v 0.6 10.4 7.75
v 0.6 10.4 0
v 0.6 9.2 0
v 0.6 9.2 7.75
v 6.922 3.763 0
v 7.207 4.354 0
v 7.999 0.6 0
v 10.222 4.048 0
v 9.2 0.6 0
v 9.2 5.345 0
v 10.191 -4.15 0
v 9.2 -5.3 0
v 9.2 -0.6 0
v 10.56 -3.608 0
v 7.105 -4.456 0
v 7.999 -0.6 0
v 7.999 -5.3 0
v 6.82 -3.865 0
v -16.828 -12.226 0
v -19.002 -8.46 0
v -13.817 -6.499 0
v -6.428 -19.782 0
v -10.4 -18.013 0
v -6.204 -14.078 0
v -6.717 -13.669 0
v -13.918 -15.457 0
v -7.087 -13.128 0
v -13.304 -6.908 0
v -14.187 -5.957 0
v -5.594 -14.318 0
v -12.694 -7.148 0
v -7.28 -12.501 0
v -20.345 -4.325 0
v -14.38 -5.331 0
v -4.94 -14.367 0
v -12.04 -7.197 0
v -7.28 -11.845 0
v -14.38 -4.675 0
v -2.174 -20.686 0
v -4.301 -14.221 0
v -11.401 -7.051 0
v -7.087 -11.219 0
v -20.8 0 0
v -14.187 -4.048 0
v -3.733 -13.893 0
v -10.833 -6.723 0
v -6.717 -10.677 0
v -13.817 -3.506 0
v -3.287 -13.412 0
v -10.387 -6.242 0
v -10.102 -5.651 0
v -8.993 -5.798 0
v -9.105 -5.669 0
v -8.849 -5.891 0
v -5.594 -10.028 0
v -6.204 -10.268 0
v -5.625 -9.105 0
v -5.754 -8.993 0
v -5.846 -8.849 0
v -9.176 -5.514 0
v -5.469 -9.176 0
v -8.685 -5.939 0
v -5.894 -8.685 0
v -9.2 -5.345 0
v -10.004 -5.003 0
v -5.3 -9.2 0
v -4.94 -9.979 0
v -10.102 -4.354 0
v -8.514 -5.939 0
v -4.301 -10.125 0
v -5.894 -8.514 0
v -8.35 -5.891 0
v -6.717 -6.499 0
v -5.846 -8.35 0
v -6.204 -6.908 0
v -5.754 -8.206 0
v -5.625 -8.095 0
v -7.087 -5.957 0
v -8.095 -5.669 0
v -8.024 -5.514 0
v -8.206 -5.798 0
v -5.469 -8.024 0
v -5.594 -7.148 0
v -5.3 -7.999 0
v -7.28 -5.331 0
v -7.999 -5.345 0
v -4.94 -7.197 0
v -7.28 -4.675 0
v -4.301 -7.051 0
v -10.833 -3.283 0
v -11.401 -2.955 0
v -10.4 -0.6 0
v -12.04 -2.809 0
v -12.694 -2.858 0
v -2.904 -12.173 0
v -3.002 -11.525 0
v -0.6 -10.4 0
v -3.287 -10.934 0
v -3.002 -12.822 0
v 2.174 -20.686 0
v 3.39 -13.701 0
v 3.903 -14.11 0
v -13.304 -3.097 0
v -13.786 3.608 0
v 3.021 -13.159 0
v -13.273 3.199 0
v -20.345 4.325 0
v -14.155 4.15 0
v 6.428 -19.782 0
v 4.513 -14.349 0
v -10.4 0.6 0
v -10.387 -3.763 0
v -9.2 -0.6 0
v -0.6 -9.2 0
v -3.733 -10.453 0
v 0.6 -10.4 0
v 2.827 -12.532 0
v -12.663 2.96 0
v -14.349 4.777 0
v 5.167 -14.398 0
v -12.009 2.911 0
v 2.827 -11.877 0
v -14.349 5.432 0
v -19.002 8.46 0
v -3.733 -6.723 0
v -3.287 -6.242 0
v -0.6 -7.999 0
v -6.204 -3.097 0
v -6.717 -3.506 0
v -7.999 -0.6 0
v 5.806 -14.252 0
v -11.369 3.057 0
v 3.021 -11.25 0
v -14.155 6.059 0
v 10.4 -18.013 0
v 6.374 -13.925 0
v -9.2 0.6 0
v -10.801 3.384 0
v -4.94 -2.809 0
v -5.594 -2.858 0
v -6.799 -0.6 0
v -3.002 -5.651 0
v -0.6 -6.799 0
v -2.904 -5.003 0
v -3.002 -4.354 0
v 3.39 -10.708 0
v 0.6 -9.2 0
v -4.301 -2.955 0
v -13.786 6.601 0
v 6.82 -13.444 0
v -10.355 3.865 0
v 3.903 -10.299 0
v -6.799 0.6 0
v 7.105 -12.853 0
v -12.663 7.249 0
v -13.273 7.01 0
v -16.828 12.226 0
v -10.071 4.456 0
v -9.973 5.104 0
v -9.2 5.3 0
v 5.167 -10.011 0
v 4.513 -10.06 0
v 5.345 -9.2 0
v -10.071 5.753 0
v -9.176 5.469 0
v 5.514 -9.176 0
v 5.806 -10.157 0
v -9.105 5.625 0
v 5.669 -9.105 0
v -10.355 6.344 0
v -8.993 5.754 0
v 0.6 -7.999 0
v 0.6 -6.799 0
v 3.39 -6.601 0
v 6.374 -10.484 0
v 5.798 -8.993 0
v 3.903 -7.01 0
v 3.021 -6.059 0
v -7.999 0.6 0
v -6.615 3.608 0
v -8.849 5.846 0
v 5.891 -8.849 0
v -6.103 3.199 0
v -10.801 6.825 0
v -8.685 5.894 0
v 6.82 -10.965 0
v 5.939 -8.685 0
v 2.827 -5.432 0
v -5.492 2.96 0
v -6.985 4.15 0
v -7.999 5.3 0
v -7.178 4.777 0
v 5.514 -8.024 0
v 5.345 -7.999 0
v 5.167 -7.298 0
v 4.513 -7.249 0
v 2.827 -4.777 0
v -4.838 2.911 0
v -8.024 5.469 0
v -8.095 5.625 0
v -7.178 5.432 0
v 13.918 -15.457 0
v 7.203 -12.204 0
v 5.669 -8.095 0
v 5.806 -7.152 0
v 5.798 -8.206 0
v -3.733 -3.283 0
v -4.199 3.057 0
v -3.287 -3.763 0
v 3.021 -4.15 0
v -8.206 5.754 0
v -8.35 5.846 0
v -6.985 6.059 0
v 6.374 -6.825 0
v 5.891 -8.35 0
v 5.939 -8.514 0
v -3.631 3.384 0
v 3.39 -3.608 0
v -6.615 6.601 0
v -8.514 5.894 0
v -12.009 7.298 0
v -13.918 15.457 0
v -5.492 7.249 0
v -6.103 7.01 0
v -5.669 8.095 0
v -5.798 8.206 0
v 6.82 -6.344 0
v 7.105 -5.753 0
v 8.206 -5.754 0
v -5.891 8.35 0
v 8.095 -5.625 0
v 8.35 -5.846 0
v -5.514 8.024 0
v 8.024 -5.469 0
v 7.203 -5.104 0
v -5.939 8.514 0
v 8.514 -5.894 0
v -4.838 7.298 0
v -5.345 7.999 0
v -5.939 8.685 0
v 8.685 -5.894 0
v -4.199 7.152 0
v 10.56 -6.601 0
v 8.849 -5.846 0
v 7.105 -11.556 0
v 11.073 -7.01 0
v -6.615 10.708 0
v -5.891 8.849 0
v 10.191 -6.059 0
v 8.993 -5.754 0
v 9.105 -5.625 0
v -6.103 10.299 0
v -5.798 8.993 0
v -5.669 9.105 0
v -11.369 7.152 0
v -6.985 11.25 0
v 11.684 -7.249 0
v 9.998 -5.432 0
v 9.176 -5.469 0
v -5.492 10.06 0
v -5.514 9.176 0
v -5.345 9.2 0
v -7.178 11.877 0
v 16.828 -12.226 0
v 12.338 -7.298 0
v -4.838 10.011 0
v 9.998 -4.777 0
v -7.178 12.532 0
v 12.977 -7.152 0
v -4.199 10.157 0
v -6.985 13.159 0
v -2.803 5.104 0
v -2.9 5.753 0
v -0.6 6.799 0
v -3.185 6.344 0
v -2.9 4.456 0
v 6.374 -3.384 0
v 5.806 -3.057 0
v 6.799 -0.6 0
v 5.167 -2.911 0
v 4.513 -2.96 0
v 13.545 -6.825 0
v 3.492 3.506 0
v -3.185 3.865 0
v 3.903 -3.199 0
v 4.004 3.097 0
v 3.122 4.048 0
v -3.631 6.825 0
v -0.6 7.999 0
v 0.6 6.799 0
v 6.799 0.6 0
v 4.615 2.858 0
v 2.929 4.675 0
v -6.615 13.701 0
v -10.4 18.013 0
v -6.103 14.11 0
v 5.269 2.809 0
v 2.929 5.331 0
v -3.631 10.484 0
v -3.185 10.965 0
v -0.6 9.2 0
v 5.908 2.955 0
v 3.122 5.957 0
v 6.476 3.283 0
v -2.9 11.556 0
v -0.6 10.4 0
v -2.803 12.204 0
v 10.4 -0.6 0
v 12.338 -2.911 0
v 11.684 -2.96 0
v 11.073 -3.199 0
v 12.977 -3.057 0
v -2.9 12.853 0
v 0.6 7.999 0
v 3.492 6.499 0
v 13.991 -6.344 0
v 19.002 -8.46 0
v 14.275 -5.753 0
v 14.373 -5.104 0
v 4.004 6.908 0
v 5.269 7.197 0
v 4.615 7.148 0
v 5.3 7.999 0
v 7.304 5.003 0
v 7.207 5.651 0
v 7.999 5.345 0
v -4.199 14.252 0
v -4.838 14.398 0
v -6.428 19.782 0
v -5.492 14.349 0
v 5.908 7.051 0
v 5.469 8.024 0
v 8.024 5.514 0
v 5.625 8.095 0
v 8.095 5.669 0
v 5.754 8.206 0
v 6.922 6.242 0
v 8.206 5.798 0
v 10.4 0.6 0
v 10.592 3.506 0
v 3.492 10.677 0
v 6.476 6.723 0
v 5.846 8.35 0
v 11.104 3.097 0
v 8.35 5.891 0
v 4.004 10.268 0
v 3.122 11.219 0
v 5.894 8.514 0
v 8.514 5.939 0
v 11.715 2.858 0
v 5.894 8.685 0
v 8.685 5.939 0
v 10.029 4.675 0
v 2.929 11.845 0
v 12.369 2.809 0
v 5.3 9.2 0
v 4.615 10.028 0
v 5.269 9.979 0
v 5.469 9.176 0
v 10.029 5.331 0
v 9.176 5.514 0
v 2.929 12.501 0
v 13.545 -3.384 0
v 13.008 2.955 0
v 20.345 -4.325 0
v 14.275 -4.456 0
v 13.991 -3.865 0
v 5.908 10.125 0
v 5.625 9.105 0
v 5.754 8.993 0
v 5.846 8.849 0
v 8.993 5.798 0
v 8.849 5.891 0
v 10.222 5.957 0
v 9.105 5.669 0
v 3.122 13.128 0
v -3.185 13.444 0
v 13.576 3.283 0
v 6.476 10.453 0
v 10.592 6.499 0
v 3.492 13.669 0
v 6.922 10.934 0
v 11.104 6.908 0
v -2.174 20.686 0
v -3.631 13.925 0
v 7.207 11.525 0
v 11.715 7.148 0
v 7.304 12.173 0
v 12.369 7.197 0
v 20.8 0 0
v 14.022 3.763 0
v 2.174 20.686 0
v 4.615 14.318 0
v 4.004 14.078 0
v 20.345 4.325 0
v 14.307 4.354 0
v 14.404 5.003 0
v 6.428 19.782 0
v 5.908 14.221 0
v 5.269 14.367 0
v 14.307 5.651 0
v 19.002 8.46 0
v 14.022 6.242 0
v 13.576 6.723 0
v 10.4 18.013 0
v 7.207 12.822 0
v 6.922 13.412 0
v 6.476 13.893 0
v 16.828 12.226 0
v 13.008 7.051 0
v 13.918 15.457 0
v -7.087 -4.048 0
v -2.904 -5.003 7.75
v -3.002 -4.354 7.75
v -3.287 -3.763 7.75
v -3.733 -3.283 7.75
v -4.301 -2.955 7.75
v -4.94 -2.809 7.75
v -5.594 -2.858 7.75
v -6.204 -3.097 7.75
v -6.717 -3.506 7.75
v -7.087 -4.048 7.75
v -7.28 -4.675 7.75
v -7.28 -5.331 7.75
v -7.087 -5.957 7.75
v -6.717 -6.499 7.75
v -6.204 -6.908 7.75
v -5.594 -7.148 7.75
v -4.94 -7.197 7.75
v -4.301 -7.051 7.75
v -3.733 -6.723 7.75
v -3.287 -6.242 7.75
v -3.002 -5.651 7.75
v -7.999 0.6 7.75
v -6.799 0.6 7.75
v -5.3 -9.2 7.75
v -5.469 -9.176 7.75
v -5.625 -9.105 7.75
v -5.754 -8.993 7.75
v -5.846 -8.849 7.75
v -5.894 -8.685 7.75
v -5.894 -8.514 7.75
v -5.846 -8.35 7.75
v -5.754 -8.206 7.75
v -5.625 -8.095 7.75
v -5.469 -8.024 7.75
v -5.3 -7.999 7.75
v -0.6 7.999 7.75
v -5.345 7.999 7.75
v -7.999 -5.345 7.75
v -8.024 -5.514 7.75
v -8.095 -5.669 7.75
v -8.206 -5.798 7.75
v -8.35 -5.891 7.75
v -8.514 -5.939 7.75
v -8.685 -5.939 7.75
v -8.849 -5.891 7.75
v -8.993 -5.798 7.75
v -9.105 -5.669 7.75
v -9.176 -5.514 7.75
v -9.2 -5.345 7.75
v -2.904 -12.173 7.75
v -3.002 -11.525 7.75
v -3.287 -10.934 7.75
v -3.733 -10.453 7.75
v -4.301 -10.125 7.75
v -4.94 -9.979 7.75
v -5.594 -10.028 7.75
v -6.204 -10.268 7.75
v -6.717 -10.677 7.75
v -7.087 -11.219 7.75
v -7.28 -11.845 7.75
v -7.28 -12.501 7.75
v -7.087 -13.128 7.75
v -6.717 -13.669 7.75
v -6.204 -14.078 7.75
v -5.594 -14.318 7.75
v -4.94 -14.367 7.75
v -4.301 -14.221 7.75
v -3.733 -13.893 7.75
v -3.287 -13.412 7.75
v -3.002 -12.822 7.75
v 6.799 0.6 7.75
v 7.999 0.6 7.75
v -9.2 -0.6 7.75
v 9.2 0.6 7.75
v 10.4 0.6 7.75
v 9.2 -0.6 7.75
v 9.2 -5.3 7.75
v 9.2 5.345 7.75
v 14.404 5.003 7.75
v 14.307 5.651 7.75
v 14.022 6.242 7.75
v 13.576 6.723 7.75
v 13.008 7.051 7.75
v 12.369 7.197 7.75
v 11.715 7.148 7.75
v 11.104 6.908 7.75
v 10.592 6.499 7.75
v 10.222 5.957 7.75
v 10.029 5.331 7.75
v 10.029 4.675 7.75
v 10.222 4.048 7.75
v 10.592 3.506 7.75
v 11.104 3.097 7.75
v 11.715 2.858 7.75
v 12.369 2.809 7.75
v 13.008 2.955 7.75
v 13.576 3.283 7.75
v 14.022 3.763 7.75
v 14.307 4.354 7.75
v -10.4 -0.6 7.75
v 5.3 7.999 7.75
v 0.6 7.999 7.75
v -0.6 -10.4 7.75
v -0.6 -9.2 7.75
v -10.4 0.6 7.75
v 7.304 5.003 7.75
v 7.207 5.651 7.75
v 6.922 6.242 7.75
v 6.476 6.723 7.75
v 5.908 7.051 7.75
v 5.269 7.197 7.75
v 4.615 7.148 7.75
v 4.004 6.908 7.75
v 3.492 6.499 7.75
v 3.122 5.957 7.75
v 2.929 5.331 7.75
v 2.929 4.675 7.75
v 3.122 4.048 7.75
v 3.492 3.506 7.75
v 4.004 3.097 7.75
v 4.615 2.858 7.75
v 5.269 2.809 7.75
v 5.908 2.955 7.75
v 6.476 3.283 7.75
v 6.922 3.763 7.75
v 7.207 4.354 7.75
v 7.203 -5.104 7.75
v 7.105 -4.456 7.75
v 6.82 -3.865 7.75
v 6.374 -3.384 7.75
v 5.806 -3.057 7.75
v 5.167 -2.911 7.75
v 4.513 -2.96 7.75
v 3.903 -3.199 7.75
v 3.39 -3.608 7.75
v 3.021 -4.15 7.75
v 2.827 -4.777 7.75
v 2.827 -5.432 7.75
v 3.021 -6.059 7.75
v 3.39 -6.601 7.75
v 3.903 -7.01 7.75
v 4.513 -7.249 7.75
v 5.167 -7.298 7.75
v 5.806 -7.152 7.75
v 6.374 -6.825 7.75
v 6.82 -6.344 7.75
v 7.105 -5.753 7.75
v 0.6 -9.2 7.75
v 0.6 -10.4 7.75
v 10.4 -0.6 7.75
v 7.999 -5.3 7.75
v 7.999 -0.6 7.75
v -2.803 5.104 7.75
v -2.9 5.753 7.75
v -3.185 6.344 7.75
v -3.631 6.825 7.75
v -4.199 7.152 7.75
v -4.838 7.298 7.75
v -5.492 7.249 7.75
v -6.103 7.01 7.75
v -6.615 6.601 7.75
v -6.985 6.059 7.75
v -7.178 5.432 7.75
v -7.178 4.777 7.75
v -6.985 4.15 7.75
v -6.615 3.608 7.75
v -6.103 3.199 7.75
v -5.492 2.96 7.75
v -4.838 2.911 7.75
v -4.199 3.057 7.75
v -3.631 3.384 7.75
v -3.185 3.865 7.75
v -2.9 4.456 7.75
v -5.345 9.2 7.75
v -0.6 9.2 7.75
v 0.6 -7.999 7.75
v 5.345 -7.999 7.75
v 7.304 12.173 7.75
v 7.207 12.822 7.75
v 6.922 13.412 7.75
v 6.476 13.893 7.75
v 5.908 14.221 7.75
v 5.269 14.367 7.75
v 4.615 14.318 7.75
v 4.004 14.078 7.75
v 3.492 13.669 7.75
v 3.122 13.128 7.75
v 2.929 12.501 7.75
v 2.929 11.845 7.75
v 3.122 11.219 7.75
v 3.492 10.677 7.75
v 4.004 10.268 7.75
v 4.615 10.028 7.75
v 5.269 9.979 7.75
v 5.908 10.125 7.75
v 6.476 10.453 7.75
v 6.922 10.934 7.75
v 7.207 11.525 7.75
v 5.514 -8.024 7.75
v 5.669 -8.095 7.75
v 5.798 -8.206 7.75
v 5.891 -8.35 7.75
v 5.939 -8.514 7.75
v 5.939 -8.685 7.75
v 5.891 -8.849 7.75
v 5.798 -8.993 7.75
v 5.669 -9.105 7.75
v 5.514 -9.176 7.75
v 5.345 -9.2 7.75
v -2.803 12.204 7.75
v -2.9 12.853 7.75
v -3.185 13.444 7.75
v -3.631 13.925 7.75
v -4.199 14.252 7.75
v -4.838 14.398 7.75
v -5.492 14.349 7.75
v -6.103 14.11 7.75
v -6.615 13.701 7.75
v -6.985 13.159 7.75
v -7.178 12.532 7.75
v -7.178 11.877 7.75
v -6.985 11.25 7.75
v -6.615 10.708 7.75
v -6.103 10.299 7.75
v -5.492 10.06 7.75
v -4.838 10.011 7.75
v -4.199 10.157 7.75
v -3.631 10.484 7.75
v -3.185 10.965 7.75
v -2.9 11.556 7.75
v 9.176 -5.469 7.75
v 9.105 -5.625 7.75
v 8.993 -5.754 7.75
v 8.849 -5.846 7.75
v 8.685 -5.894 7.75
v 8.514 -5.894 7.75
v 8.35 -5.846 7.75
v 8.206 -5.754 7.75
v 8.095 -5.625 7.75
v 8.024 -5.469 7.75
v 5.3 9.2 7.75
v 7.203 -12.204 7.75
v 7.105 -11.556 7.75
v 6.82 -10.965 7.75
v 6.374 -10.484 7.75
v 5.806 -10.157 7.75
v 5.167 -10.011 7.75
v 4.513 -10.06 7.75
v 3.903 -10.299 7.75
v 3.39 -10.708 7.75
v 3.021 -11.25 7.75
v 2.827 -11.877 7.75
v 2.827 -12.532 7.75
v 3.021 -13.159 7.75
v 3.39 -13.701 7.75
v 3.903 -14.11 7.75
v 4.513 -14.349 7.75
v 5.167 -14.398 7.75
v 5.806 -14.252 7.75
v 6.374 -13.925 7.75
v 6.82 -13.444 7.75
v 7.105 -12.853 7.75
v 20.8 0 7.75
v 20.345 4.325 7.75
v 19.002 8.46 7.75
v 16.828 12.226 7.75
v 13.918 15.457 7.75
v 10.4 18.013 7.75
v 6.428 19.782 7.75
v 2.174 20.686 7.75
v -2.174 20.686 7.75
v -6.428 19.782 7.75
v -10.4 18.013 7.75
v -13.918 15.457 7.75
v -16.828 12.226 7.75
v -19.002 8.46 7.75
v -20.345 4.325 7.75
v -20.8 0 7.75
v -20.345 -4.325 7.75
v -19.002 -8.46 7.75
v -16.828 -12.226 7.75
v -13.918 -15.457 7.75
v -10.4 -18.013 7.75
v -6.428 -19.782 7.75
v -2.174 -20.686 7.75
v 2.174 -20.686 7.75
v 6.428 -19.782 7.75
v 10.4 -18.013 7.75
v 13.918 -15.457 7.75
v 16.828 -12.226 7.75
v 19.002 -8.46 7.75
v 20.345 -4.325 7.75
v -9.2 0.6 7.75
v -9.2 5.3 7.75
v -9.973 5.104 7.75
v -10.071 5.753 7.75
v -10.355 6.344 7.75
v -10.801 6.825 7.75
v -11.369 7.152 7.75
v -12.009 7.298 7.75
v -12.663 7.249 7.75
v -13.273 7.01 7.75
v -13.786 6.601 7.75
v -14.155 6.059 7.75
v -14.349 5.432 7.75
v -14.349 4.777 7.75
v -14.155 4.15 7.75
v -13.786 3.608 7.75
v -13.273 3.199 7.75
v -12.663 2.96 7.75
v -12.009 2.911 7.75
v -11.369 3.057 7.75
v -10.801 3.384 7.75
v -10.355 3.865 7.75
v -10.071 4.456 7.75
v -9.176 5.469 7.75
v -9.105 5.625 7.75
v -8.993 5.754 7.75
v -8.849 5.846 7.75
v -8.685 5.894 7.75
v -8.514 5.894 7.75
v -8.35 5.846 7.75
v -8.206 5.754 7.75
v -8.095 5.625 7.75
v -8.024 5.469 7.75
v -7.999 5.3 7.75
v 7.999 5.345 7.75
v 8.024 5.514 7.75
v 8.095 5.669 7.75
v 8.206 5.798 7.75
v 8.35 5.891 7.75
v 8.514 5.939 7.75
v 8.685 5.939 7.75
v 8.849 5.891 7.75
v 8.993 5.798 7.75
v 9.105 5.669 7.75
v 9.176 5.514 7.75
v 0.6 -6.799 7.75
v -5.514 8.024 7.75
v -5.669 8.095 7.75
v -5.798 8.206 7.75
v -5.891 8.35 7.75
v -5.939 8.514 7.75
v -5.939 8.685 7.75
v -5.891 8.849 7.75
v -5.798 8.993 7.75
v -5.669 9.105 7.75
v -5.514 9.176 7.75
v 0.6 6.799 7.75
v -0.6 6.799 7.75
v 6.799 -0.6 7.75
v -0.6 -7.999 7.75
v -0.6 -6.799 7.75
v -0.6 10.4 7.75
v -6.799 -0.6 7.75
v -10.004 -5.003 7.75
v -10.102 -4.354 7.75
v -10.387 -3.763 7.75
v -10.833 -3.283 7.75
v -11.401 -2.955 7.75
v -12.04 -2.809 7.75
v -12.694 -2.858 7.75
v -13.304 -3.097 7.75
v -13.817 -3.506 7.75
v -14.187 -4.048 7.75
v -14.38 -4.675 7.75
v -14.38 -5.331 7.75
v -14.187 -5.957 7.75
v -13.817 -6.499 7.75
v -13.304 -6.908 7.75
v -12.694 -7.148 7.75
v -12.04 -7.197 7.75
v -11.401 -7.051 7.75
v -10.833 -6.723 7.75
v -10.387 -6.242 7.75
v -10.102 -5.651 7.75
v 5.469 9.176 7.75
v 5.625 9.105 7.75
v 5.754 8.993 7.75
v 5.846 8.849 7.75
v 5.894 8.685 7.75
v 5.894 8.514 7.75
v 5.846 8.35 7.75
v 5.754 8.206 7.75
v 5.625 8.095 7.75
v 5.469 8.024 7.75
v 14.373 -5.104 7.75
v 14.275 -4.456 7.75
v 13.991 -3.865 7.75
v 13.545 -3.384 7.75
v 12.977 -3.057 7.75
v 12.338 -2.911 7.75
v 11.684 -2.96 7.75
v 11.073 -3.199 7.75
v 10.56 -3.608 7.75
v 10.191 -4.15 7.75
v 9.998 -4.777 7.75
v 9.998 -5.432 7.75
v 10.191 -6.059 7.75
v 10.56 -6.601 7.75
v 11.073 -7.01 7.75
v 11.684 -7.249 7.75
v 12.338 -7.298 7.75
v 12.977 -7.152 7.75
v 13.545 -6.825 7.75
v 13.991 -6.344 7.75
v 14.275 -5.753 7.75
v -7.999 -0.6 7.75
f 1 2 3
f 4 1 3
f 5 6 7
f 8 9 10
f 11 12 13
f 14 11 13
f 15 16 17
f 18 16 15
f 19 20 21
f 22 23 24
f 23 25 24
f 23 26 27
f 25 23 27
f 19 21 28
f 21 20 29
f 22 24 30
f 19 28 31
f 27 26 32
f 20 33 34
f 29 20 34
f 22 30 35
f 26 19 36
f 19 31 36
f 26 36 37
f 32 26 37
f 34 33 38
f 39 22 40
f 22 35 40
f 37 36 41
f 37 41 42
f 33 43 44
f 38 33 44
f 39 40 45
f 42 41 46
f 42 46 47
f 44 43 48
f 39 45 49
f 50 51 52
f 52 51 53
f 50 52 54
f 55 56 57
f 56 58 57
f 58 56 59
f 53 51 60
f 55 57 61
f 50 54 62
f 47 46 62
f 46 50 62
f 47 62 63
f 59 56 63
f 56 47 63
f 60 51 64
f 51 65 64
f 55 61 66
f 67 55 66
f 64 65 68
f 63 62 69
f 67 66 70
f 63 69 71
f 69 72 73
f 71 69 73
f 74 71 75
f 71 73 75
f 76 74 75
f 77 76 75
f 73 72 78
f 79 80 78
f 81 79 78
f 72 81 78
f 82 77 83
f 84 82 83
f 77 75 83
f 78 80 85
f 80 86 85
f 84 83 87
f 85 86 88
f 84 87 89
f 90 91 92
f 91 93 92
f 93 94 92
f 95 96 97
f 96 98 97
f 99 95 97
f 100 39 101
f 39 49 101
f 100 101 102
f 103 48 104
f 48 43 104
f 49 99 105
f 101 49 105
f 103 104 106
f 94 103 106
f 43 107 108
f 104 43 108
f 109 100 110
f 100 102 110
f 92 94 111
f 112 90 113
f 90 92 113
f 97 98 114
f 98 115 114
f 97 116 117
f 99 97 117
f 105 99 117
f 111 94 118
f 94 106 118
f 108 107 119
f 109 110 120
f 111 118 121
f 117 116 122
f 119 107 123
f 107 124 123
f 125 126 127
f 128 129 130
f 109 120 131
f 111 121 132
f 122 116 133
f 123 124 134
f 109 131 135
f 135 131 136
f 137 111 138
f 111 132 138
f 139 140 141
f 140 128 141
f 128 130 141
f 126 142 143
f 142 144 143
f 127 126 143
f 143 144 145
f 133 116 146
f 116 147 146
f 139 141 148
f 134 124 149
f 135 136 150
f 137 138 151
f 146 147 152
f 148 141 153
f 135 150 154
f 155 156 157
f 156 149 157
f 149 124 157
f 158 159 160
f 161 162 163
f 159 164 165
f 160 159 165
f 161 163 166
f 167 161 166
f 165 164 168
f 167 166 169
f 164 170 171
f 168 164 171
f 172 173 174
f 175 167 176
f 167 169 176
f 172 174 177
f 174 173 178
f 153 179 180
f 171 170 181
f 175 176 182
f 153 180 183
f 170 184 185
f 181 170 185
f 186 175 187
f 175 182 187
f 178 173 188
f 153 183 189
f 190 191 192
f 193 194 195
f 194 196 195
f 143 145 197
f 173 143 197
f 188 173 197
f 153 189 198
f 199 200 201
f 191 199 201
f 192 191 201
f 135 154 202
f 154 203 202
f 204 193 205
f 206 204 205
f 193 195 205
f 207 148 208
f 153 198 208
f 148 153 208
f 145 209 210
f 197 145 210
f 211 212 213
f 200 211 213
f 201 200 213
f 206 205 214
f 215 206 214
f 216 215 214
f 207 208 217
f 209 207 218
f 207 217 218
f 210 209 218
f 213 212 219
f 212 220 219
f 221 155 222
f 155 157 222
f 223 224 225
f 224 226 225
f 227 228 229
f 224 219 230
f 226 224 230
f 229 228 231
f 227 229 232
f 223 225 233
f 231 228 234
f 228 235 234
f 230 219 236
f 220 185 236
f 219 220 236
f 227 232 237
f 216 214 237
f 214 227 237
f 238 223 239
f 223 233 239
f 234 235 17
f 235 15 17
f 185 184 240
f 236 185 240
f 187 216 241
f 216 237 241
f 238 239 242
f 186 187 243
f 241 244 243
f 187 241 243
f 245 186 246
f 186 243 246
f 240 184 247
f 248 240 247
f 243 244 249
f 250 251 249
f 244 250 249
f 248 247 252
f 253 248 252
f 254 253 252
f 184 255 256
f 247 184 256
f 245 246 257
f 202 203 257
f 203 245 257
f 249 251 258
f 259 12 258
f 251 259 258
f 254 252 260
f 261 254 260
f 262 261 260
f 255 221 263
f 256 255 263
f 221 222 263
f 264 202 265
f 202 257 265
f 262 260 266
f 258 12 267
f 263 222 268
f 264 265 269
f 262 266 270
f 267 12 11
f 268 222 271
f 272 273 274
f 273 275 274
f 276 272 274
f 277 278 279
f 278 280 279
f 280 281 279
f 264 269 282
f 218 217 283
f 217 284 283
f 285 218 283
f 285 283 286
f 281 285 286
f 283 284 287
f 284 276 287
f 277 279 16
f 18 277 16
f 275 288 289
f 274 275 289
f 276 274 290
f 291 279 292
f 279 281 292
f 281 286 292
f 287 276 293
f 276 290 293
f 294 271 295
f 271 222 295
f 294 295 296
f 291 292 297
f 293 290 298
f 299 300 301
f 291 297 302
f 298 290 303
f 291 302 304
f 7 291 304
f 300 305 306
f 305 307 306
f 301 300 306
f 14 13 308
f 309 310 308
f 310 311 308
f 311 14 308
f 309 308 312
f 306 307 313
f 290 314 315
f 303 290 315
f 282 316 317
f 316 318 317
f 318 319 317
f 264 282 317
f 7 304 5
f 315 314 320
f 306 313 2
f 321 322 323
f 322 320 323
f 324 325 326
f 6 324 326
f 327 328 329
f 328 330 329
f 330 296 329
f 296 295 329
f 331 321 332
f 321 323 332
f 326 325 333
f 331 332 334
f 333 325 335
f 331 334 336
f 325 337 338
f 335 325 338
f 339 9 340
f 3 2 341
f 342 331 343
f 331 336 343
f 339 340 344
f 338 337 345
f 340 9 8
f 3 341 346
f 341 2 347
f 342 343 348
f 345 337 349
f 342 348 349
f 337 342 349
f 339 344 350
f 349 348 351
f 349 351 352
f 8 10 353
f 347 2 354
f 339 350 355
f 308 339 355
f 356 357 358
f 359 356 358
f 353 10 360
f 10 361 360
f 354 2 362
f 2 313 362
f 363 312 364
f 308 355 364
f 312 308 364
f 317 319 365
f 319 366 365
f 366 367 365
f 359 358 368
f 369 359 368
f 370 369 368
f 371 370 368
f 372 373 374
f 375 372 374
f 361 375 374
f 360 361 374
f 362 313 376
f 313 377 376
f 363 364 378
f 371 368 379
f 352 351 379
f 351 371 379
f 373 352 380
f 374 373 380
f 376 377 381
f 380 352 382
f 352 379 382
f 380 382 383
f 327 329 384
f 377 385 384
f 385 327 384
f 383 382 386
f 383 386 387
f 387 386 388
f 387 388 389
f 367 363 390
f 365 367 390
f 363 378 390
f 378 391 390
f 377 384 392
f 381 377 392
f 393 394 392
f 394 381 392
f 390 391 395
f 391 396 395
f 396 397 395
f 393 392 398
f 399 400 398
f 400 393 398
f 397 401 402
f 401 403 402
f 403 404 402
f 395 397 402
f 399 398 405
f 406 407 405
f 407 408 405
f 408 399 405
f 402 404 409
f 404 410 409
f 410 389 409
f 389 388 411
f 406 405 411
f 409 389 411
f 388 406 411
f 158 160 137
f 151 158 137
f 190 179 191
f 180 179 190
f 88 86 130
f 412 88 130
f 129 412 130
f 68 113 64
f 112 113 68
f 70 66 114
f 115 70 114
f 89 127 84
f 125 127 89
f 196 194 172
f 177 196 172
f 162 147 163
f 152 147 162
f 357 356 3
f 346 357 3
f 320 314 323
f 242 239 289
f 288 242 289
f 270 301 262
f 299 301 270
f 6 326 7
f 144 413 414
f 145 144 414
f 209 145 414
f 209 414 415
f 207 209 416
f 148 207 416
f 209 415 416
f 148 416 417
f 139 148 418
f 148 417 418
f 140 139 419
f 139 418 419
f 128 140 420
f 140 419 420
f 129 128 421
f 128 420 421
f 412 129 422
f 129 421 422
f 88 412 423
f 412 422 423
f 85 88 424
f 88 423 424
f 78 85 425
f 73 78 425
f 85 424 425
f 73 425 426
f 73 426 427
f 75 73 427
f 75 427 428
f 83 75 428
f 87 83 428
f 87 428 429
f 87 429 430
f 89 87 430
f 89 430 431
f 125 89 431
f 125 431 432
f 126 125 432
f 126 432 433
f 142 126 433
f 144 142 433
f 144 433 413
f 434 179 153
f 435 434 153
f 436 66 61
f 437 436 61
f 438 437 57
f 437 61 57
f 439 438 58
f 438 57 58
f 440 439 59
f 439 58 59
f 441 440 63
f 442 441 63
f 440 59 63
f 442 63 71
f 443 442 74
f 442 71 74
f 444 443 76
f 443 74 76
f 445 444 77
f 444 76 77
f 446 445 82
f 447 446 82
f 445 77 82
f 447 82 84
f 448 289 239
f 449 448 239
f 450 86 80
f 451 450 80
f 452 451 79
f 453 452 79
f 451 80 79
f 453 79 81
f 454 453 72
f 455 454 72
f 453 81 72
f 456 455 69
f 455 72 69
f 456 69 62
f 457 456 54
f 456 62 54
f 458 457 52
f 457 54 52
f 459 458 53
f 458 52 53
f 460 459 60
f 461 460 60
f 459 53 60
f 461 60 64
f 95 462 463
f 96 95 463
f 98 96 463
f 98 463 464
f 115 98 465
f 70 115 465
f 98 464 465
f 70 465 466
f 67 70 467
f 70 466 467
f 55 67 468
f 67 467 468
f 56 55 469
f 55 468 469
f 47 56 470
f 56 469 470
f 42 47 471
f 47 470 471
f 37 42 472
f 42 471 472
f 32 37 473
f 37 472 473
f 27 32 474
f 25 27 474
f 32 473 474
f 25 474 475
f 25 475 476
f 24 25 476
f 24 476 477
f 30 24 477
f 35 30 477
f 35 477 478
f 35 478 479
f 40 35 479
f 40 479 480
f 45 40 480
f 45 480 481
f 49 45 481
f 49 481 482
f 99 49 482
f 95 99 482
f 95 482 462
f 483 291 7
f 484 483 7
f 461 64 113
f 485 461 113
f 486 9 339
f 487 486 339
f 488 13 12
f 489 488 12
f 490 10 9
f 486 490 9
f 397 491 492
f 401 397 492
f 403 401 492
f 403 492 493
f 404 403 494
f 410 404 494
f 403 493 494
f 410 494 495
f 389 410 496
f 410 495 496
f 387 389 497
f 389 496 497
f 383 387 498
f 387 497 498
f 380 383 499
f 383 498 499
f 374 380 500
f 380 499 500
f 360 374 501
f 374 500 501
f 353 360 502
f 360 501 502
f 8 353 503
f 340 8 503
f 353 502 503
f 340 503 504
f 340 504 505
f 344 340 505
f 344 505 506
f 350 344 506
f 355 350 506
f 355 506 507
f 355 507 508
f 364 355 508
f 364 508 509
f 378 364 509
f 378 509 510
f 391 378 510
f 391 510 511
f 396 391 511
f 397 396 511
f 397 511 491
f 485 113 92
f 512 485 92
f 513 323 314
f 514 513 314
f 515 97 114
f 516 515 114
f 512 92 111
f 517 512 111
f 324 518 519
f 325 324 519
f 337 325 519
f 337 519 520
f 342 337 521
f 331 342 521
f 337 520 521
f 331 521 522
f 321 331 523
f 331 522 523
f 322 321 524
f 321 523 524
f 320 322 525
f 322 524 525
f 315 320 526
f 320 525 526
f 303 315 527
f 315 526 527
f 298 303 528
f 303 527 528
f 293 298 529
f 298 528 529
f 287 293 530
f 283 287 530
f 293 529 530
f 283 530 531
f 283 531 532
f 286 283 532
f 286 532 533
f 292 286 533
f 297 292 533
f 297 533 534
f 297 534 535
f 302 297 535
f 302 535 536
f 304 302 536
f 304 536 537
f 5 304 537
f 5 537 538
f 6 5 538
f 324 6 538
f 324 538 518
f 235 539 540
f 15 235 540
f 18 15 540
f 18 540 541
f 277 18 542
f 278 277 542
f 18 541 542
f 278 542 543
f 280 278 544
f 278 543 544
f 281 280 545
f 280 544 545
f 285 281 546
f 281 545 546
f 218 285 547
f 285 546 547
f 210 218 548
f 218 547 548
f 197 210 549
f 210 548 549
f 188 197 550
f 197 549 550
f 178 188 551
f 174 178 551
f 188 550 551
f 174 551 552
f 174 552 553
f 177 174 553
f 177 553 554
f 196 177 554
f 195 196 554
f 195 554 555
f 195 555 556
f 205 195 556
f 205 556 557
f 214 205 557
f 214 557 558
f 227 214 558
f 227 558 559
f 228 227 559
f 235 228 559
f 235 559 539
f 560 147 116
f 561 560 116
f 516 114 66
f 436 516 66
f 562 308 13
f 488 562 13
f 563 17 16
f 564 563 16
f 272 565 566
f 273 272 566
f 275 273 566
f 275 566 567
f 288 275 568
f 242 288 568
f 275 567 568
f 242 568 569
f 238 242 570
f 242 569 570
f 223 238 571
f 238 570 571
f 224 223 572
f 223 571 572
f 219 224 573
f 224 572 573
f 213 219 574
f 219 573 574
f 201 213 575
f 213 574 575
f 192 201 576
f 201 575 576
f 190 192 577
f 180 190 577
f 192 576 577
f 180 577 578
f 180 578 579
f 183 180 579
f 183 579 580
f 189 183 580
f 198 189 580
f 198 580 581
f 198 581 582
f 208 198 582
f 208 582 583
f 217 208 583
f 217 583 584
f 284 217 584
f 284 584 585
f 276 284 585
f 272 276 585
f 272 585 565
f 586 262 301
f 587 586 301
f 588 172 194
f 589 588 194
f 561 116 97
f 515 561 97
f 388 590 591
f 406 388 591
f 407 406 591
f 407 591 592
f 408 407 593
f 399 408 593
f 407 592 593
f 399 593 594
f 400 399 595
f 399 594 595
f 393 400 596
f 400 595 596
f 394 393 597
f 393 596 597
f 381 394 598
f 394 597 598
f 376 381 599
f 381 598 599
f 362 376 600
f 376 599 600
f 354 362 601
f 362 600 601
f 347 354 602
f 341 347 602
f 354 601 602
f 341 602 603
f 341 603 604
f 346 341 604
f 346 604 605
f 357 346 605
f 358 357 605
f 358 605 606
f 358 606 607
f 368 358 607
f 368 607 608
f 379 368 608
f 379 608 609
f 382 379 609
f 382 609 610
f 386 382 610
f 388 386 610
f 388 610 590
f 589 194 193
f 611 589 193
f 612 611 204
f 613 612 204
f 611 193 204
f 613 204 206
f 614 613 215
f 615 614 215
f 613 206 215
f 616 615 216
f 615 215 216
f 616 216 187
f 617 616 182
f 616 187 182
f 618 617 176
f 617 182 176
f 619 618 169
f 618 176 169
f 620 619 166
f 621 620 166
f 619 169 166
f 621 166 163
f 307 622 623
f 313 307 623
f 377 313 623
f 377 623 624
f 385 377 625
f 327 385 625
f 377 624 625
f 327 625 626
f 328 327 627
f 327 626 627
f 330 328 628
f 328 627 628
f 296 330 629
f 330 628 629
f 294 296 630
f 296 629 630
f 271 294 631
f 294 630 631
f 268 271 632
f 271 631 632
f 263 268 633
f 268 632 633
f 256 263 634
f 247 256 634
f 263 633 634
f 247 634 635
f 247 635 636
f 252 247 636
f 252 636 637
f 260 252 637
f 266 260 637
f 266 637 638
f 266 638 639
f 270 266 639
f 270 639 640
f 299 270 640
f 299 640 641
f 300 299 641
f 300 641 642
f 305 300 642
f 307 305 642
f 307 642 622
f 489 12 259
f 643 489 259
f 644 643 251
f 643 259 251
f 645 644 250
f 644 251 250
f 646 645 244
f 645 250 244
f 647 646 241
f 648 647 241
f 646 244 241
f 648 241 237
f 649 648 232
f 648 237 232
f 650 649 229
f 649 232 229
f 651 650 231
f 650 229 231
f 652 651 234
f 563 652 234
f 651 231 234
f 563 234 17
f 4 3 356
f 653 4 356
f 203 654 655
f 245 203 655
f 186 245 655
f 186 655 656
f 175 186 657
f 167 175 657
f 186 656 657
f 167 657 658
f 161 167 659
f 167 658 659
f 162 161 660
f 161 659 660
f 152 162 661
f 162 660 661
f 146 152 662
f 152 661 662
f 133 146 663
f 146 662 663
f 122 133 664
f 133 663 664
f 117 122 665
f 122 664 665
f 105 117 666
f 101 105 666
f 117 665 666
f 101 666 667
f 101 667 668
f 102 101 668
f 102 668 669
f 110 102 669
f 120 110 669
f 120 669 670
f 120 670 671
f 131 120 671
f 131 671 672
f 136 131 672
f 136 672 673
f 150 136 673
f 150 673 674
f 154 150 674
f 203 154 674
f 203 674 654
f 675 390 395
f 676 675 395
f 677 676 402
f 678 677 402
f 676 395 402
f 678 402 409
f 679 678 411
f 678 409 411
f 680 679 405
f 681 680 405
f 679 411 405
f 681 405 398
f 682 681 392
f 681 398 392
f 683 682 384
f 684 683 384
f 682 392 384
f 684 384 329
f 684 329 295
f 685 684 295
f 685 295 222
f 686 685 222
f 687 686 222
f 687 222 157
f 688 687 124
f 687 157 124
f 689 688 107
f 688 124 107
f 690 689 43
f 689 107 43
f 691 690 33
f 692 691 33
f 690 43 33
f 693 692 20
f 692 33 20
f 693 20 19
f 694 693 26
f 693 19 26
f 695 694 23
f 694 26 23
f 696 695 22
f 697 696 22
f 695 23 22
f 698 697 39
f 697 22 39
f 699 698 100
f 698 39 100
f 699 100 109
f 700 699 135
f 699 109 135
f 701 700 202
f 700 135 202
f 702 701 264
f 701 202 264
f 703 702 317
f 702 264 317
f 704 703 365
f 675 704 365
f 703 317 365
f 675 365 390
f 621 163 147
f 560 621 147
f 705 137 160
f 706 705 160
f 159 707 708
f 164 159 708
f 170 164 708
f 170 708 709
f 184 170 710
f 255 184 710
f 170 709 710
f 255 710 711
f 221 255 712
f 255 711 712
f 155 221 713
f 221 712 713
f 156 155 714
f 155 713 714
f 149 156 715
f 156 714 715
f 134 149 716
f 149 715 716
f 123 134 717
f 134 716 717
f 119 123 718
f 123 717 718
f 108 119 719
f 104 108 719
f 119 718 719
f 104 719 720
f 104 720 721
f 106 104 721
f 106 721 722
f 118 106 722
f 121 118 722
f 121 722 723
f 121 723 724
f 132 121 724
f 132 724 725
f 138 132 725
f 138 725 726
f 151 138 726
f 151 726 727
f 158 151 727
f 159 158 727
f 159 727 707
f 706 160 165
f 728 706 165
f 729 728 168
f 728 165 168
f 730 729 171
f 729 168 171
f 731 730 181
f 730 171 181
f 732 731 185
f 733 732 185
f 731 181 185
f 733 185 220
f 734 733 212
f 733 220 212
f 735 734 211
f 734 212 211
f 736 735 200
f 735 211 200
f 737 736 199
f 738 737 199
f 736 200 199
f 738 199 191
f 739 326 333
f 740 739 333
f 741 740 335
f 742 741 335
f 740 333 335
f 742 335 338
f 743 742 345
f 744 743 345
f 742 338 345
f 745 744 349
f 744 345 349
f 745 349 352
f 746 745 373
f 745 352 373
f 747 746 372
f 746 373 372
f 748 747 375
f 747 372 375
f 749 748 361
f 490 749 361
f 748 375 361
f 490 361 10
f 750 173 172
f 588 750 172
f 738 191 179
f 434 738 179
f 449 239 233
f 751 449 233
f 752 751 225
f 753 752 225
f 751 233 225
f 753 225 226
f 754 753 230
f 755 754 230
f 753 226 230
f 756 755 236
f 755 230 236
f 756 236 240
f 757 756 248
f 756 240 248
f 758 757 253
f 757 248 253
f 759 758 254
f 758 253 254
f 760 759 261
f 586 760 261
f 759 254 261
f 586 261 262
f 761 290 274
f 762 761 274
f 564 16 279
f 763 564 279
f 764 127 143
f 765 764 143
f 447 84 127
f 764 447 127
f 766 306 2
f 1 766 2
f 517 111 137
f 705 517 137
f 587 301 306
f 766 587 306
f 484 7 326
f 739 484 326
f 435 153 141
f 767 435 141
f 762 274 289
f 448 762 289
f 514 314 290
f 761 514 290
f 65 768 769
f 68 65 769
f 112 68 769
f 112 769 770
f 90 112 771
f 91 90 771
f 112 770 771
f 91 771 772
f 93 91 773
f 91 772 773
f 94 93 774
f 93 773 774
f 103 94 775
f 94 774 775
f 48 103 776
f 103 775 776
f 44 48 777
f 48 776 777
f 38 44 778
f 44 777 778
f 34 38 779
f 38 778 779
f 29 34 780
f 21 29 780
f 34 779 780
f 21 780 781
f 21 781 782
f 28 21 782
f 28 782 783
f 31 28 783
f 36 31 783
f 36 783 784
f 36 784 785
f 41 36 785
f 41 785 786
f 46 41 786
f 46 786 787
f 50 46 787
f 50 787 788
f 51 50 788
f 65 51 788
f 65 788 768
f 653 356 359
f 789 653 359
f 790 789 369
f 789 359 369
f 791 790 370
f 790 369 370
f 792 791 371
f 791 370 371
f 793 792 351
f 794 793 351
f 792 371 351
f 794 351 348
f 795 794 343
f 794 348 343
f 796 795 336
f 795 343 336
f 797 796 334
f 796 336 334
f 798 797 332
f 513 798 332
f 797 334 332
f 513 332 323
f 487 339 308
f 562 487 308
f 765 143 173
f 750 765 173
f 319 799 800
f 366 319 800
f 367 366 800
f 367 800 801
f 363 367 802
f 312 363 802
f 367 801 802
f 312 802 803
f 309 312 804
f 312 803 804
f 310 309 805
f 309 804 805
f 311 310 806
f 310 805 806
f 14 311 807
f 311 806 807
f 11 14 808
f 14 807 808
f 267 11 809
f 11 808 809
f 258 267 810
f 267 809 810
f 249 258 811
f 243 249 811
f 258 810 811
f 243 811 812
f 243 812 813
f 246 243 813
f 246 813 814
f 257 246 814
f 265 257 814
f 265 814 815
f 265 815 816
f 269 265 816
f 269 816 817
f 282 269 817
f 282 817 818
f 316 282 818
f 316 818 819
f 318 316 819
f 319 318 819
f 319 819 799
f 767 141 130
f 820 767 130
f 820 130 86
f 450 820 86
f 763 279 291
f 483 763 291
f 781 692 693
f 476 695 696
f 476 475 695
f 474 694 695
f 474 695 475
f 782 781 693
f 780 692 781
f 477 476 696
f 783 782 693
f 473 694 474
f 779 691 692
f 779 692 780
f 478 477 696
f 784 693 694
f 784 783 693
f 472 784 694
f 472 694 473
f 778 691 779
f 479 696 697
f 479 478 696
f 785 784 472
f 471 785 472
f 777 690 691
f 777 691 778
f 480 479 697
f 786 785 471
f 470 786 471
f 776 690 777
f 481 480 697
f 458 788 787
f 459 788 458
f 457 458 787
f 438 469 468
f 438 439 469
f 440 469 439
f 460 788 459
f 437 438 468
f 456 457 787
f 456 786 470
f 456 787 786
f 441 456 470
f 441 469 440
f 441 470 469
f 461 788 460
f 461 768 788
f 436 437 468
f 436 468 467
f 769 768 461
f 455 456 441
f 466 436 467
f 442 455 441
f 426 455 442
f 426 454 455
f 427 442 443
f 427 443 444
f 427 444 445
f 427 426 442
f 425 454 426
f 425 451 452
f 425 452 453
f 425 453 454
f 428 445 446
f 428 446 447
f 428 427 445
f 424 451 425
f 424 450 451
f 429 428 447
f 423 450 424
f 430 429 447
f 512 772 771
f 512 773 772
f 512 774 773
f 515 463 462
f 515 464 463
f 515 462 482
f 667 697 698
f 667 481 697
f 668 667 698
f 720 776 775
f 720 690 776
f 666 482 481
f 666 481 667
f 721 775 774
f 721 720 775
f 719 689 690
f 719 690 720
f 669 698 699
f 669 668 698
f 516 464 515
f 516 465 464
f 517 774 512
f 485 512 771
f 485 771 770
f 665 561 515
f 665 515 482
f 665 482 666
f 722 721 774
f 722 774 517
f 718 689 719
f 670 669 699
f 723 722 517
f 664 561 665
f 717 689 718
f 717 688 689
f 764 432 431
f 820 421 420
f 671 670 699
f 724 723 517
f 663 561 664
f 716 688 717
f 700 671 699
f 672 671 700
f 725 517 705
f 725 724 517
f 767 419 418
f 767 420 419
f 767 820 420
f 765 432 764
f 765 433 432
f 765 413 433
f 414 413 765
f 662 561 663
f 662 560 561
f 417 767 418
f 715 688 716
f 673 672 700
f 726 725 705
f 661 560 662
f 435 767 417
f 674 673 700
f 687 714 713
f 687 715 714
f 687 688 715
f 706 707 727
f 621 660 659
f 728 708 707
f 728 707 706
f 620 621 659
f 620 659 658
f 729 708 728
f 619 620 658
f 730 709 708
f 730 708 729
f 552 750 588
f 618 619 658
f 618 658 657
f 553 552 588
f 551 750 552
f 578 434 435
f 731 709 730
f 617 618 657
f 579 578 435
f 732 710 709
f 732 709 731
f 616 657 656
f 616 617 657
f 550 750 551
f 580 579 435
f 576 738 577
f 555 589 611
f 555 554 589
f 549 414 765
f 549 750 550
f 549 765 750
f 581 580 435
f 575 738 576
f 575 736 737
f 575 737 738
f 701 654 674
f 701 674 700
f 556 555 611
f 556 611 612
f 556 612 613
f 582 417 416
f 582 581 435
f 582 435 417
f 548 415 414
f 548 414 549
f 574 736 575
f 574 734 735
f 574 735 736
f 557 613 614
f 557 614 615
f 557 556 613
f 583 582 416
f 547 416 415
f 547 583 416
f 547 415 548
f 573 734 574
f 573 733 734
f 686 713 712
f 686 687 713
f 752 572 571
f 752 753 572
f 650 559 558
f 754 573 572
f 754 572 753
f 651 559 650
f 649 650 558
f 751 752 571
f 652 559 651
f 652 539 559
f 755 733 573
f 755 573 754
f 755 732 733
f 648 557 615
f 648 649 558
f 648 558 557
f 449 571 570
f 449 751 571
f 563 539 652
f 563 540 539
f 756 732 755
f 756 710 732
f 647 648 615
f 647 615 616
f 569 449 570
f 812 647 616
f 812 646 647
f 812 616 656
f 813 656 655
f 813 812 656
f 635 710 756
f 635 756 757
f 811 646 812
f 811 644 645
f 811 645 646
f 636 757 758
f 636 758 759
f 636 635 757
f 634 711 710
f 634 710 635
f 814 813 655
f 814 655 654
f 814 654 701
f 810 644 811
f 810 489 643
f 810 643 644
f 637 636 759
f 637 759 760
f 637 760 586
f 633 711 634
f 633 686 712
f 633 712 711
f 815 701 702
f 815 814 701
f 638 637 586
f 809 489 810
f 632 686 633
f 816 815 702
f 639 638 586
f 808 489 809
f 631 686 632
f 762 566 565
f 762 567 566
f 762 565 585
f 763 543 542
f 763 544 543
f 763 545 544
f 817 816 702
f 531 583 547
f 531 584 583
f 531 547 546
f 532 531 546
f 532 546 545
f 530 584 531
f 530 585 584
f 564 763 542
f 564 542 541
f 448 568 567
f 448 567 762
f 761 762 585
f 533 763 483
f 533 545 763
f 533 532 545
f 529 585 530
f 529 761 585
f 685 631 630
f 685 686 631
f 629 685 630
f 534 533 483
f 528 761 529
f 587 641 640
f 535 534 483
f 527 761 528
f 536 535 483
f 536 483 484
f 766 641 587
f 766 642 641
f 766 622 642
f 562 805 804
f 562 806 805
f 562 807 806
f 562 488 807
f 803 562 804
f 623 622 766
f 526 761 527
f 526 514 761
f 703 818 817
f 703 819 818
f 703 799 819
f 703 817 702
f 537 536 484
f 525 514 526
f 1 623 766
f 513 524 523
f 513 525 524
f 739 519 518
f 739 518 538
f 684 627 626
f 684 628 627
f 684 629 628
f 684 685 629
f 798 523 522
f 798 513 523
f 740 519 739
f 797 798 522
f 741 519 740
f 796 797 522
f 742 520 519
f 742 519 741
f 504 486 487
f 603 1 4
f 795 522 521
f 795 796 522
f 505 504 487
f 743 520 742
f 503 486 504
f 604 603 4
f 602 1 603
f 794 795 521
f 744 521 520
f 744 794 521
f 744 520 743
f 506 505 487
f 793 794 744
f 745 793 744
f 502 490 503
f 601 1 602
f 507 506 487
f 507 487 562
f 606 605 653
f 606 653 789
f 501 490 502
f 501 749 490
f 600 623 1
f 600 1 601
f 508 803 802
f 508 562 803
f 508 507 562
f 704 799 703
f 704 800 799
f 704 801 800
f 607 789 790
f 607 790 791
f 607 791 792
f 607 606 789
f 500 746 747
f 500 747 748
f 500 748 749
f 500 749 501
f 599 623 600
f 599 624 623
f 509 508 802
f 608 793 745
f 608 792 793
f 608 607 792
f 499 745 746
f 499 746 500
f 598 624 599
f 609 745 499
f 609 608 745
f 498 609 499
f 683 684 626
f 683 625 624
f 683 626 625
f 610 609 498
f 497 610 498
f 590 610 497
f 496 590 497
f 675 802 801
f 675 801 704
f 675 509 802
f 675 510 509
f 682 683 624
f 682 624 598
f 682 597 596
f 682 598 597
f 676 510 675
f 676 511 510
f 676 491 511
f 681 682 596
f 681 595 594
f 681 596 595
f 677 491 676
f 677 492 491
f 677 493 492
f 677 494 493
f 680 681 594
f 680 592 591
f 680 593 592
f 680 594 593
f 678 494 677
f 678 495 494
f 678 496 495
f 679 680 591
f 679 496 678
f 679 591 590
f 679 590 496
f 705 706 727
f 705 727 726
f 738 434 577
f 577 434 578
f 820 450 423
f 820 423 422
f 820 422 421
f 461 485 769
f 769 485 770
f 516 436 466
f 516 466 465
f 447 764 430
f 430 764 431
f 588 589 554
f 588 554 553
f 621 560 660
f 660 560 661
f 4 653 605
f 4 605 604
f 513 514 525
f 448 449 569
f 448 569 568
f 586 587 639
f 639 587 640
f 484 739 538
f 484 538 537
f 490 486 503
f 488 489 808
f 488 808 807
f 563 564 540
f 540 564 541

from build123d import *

# Parameters (mm, degrees)
F0_R     = 20.8
F1_DEPTH = 7.75
F2_R     = 2.2
F3_DEPTH = 7.751
F5_DEPTH = 7.751


with BuildPart() as f1:
    # F0 (on Top) → F1 (new body)
    with BuildSketch(Plane.XY):
        Circle(F0_R)
    extrude(amount=F1_DEPTH)

    # F2 (on face) → F3 (cut, through all)
    with BuildSketch(Plane.XY.offset(7.75)):
        with Locations((-5.002671, 12.204482)):
            Circle(F2_R)
        with Locations((-5.002671, 5.104482)):
            Circle(F2_R)
        with Locations((-12.173096, 5.104482)):
            Circle(F2_R)
        with Locations((-12.204482, -5.002671)):
            Circle(F2_R)
        with Locations((-5.104482, -5.002671)):
            Circle(F2_R)
        with Locations((-5.104482, -12.173096)):
            Circle(F2_R)
        with Locations((5.002671, -12.204482)):
            Circle(F2_R)
        with Locations((5.002671, -5.104482)):
            Circle(F2_R)
        with Locations((12.173096, -5.104482)):
            Circle(F2_R)
        with Locations((12.204482, 5.002671)):
            Circle(F2_R)
        with Locations((5.104482, 5.002671)):
            Circle(F2_R)
        with Locations((5.104482, 12.173096)):
            Circle(F2_R)
    extrude(amount=-F3_DEPTH, mode=Mode.SUBTRACT)

    # F4 (on face) → F5 (cut, through all)
    with BuildSketch(Plane(origin=(0, 0, 0), x_dir=(1, 0, 0), z_dir=(0, 0, -1))):
        with BuildLine():
            Line((6.799199, 0.6), (6.799199, -0.6))
            Line((6.799199, -0.6), (7.999199, -0.6))
            Line((7.999199, -0.6), (7.999199, -1.8))
            Line((7.999199, -1.8), (7.999199, -5.344601))
            ThreePointArc((7.999199, -5.344601), (8.5996, -5.945002), (9.2, -5.344601))
            Line((9.2, -5.344601), (9.2, -1.8))
            Line((9.2, -1.8), (9.2, -0.6))
            Line((9.2, -0.6), (10.4, -0.6))
            Line((10.4, -0.6), (10.4, 0.6))
            Line((10.4, 0.6), (9.2, 0.6))
            Line((9.2, 0.6), (9.2, 1.8))
            Line((9.2, 1.8), (9.2, 5.3))
            ThreePointArc((9.2, 5.3), (8.5996, 5.9004), (7.999199, 5.3))
            Line((7.999199, 5.3), (7.999199, 1.8))
            Line((7.999199, 1.8), (7.999199, 0.6))
            Line((7.999199, 0.6), (6.799199, 0.6))
        make_face()
        with BuildLine():
            Line((-1.8, 9.2), (-5.3, 9.2))
            ThreePointArc((-5.3, 9.2), (-5.9004, 8.5996), (-5.3, 7.999199))
            Line((-5.3, 7.999199), (-1.8, 7.999199))
            Line((-1.8, 7.999199), (-0.6, 7.999199))
            Line((-0.6, 7.999199), (-0.6, 6.799199))
            Line((-0.6, 6.799199), (0.6, 6.799199))
            Line((0.6, 6.799199), (0.6, 7.999199))
            Line((0.6, 7.999199), (1.8, 7.999199))
            Line((1.8, 7.999199), (5.344601, 7.999199))
            ThreePointArc((5.344601, 7.999199), (5.945002, 8.5996), (5.344601, 9.2))
            Line((5.344601, 9.2), (1.8, 9.2))
            Line((1.8, 9.2), (0.6, 9.2))
            Line((0.6, 9.2), (0.6, 10.4))
            Line((0.6, 10.4), (-0.6, 10.4))
            Line((-0.6, 10.4), (-0.6, 9.2))
            Line((-0.6, 9.2), (-1.8, 9.2))
        make_face()
        with BuildLine():
            Line((-9.2, -1.8), (-9.2, -5.3))
            ThreePointArc((-9.2, -5.3), (-8.5996, -5.9004), (-7.999199, -5.3))
            Line((-7.999199, -5.3), (-7.999199, -1.8))
            Line((-7.999199, -1.8), (-7.999199, -0.6))
            Line((-7.999199, -0.6), (-6.799199, -0.6))
            Line((-6.799199, -0.6), (-6.799199, 0.6))
            Line((-6.799199, 0.6), (-7.999199, 0.6))
            Line((-7.999199, 0.6), (-7.999199, 1.8))
            Line((-7.999199, 1.8), (-7.999199, 5.344601))
            ThreePointArc((-7.999199, 5.344601), (-8.5996, 5.945002), (-9.2, 5.344601))
            Line((-9.2, 5.344601), (-9.2, 1.8))
            Line((-9.2, 1.8), (-9.2, 0.6))
            Line((-9.2, 0.6), (-10.4, 0.6))
            Line((-10.4, 0.6), (-10.4, -0.6))
            Line((-10.4, -0.6), (-9.2, -0.6))
            Line((-9.2, -0.6), (-9.2, -1.8))
        make_face()
        with BuildLine():
            Line((1.8, -9.2), (5.3, -9.2))
            ThreePointArc((5.3, -9.2), (5.9004, -8.5996), (5.3, -7.999199))
            Line((5.3, -7.999199), (1.8, -7.999199))
            Line((1.8, -7.999199), (0.6, -7.999199))
            Line((0.6, -7.999199), (0.6, -6.799199))
            Line((0.6, -6.799199), (-0.6, -6.799199))
            Line((-0.6, -6.799199), (-0.6, -7.999199))
            Line((-0.6, -7.999199), (-1.8, -7.999199))
            Line((-1.8, -7.999199), (-5.344601, -7.999199))
            ThreePointArc((-5.344601, -7.999199), (-5.945002, -8.5996), (-5.344601, -9.2))
            Line((-5.344601, -9.2), (-1.8, -9.2))
            Line((-1.8, -9.2), (-0.6, -9.2))
            Line((-0.6, -9.2), (-0.6, -10.4))
            Line((-0.6, -10.4), (0.6, -10.4))
            Line((0.6, -10.4), (0.6, -9.2))
            Line((0.6, -9.2), (1.8, -9.2))
        make_face()
    extrude(amount=-F5_DEPTH, mode=Mode.SUBTRACT)


solid = f1.part
